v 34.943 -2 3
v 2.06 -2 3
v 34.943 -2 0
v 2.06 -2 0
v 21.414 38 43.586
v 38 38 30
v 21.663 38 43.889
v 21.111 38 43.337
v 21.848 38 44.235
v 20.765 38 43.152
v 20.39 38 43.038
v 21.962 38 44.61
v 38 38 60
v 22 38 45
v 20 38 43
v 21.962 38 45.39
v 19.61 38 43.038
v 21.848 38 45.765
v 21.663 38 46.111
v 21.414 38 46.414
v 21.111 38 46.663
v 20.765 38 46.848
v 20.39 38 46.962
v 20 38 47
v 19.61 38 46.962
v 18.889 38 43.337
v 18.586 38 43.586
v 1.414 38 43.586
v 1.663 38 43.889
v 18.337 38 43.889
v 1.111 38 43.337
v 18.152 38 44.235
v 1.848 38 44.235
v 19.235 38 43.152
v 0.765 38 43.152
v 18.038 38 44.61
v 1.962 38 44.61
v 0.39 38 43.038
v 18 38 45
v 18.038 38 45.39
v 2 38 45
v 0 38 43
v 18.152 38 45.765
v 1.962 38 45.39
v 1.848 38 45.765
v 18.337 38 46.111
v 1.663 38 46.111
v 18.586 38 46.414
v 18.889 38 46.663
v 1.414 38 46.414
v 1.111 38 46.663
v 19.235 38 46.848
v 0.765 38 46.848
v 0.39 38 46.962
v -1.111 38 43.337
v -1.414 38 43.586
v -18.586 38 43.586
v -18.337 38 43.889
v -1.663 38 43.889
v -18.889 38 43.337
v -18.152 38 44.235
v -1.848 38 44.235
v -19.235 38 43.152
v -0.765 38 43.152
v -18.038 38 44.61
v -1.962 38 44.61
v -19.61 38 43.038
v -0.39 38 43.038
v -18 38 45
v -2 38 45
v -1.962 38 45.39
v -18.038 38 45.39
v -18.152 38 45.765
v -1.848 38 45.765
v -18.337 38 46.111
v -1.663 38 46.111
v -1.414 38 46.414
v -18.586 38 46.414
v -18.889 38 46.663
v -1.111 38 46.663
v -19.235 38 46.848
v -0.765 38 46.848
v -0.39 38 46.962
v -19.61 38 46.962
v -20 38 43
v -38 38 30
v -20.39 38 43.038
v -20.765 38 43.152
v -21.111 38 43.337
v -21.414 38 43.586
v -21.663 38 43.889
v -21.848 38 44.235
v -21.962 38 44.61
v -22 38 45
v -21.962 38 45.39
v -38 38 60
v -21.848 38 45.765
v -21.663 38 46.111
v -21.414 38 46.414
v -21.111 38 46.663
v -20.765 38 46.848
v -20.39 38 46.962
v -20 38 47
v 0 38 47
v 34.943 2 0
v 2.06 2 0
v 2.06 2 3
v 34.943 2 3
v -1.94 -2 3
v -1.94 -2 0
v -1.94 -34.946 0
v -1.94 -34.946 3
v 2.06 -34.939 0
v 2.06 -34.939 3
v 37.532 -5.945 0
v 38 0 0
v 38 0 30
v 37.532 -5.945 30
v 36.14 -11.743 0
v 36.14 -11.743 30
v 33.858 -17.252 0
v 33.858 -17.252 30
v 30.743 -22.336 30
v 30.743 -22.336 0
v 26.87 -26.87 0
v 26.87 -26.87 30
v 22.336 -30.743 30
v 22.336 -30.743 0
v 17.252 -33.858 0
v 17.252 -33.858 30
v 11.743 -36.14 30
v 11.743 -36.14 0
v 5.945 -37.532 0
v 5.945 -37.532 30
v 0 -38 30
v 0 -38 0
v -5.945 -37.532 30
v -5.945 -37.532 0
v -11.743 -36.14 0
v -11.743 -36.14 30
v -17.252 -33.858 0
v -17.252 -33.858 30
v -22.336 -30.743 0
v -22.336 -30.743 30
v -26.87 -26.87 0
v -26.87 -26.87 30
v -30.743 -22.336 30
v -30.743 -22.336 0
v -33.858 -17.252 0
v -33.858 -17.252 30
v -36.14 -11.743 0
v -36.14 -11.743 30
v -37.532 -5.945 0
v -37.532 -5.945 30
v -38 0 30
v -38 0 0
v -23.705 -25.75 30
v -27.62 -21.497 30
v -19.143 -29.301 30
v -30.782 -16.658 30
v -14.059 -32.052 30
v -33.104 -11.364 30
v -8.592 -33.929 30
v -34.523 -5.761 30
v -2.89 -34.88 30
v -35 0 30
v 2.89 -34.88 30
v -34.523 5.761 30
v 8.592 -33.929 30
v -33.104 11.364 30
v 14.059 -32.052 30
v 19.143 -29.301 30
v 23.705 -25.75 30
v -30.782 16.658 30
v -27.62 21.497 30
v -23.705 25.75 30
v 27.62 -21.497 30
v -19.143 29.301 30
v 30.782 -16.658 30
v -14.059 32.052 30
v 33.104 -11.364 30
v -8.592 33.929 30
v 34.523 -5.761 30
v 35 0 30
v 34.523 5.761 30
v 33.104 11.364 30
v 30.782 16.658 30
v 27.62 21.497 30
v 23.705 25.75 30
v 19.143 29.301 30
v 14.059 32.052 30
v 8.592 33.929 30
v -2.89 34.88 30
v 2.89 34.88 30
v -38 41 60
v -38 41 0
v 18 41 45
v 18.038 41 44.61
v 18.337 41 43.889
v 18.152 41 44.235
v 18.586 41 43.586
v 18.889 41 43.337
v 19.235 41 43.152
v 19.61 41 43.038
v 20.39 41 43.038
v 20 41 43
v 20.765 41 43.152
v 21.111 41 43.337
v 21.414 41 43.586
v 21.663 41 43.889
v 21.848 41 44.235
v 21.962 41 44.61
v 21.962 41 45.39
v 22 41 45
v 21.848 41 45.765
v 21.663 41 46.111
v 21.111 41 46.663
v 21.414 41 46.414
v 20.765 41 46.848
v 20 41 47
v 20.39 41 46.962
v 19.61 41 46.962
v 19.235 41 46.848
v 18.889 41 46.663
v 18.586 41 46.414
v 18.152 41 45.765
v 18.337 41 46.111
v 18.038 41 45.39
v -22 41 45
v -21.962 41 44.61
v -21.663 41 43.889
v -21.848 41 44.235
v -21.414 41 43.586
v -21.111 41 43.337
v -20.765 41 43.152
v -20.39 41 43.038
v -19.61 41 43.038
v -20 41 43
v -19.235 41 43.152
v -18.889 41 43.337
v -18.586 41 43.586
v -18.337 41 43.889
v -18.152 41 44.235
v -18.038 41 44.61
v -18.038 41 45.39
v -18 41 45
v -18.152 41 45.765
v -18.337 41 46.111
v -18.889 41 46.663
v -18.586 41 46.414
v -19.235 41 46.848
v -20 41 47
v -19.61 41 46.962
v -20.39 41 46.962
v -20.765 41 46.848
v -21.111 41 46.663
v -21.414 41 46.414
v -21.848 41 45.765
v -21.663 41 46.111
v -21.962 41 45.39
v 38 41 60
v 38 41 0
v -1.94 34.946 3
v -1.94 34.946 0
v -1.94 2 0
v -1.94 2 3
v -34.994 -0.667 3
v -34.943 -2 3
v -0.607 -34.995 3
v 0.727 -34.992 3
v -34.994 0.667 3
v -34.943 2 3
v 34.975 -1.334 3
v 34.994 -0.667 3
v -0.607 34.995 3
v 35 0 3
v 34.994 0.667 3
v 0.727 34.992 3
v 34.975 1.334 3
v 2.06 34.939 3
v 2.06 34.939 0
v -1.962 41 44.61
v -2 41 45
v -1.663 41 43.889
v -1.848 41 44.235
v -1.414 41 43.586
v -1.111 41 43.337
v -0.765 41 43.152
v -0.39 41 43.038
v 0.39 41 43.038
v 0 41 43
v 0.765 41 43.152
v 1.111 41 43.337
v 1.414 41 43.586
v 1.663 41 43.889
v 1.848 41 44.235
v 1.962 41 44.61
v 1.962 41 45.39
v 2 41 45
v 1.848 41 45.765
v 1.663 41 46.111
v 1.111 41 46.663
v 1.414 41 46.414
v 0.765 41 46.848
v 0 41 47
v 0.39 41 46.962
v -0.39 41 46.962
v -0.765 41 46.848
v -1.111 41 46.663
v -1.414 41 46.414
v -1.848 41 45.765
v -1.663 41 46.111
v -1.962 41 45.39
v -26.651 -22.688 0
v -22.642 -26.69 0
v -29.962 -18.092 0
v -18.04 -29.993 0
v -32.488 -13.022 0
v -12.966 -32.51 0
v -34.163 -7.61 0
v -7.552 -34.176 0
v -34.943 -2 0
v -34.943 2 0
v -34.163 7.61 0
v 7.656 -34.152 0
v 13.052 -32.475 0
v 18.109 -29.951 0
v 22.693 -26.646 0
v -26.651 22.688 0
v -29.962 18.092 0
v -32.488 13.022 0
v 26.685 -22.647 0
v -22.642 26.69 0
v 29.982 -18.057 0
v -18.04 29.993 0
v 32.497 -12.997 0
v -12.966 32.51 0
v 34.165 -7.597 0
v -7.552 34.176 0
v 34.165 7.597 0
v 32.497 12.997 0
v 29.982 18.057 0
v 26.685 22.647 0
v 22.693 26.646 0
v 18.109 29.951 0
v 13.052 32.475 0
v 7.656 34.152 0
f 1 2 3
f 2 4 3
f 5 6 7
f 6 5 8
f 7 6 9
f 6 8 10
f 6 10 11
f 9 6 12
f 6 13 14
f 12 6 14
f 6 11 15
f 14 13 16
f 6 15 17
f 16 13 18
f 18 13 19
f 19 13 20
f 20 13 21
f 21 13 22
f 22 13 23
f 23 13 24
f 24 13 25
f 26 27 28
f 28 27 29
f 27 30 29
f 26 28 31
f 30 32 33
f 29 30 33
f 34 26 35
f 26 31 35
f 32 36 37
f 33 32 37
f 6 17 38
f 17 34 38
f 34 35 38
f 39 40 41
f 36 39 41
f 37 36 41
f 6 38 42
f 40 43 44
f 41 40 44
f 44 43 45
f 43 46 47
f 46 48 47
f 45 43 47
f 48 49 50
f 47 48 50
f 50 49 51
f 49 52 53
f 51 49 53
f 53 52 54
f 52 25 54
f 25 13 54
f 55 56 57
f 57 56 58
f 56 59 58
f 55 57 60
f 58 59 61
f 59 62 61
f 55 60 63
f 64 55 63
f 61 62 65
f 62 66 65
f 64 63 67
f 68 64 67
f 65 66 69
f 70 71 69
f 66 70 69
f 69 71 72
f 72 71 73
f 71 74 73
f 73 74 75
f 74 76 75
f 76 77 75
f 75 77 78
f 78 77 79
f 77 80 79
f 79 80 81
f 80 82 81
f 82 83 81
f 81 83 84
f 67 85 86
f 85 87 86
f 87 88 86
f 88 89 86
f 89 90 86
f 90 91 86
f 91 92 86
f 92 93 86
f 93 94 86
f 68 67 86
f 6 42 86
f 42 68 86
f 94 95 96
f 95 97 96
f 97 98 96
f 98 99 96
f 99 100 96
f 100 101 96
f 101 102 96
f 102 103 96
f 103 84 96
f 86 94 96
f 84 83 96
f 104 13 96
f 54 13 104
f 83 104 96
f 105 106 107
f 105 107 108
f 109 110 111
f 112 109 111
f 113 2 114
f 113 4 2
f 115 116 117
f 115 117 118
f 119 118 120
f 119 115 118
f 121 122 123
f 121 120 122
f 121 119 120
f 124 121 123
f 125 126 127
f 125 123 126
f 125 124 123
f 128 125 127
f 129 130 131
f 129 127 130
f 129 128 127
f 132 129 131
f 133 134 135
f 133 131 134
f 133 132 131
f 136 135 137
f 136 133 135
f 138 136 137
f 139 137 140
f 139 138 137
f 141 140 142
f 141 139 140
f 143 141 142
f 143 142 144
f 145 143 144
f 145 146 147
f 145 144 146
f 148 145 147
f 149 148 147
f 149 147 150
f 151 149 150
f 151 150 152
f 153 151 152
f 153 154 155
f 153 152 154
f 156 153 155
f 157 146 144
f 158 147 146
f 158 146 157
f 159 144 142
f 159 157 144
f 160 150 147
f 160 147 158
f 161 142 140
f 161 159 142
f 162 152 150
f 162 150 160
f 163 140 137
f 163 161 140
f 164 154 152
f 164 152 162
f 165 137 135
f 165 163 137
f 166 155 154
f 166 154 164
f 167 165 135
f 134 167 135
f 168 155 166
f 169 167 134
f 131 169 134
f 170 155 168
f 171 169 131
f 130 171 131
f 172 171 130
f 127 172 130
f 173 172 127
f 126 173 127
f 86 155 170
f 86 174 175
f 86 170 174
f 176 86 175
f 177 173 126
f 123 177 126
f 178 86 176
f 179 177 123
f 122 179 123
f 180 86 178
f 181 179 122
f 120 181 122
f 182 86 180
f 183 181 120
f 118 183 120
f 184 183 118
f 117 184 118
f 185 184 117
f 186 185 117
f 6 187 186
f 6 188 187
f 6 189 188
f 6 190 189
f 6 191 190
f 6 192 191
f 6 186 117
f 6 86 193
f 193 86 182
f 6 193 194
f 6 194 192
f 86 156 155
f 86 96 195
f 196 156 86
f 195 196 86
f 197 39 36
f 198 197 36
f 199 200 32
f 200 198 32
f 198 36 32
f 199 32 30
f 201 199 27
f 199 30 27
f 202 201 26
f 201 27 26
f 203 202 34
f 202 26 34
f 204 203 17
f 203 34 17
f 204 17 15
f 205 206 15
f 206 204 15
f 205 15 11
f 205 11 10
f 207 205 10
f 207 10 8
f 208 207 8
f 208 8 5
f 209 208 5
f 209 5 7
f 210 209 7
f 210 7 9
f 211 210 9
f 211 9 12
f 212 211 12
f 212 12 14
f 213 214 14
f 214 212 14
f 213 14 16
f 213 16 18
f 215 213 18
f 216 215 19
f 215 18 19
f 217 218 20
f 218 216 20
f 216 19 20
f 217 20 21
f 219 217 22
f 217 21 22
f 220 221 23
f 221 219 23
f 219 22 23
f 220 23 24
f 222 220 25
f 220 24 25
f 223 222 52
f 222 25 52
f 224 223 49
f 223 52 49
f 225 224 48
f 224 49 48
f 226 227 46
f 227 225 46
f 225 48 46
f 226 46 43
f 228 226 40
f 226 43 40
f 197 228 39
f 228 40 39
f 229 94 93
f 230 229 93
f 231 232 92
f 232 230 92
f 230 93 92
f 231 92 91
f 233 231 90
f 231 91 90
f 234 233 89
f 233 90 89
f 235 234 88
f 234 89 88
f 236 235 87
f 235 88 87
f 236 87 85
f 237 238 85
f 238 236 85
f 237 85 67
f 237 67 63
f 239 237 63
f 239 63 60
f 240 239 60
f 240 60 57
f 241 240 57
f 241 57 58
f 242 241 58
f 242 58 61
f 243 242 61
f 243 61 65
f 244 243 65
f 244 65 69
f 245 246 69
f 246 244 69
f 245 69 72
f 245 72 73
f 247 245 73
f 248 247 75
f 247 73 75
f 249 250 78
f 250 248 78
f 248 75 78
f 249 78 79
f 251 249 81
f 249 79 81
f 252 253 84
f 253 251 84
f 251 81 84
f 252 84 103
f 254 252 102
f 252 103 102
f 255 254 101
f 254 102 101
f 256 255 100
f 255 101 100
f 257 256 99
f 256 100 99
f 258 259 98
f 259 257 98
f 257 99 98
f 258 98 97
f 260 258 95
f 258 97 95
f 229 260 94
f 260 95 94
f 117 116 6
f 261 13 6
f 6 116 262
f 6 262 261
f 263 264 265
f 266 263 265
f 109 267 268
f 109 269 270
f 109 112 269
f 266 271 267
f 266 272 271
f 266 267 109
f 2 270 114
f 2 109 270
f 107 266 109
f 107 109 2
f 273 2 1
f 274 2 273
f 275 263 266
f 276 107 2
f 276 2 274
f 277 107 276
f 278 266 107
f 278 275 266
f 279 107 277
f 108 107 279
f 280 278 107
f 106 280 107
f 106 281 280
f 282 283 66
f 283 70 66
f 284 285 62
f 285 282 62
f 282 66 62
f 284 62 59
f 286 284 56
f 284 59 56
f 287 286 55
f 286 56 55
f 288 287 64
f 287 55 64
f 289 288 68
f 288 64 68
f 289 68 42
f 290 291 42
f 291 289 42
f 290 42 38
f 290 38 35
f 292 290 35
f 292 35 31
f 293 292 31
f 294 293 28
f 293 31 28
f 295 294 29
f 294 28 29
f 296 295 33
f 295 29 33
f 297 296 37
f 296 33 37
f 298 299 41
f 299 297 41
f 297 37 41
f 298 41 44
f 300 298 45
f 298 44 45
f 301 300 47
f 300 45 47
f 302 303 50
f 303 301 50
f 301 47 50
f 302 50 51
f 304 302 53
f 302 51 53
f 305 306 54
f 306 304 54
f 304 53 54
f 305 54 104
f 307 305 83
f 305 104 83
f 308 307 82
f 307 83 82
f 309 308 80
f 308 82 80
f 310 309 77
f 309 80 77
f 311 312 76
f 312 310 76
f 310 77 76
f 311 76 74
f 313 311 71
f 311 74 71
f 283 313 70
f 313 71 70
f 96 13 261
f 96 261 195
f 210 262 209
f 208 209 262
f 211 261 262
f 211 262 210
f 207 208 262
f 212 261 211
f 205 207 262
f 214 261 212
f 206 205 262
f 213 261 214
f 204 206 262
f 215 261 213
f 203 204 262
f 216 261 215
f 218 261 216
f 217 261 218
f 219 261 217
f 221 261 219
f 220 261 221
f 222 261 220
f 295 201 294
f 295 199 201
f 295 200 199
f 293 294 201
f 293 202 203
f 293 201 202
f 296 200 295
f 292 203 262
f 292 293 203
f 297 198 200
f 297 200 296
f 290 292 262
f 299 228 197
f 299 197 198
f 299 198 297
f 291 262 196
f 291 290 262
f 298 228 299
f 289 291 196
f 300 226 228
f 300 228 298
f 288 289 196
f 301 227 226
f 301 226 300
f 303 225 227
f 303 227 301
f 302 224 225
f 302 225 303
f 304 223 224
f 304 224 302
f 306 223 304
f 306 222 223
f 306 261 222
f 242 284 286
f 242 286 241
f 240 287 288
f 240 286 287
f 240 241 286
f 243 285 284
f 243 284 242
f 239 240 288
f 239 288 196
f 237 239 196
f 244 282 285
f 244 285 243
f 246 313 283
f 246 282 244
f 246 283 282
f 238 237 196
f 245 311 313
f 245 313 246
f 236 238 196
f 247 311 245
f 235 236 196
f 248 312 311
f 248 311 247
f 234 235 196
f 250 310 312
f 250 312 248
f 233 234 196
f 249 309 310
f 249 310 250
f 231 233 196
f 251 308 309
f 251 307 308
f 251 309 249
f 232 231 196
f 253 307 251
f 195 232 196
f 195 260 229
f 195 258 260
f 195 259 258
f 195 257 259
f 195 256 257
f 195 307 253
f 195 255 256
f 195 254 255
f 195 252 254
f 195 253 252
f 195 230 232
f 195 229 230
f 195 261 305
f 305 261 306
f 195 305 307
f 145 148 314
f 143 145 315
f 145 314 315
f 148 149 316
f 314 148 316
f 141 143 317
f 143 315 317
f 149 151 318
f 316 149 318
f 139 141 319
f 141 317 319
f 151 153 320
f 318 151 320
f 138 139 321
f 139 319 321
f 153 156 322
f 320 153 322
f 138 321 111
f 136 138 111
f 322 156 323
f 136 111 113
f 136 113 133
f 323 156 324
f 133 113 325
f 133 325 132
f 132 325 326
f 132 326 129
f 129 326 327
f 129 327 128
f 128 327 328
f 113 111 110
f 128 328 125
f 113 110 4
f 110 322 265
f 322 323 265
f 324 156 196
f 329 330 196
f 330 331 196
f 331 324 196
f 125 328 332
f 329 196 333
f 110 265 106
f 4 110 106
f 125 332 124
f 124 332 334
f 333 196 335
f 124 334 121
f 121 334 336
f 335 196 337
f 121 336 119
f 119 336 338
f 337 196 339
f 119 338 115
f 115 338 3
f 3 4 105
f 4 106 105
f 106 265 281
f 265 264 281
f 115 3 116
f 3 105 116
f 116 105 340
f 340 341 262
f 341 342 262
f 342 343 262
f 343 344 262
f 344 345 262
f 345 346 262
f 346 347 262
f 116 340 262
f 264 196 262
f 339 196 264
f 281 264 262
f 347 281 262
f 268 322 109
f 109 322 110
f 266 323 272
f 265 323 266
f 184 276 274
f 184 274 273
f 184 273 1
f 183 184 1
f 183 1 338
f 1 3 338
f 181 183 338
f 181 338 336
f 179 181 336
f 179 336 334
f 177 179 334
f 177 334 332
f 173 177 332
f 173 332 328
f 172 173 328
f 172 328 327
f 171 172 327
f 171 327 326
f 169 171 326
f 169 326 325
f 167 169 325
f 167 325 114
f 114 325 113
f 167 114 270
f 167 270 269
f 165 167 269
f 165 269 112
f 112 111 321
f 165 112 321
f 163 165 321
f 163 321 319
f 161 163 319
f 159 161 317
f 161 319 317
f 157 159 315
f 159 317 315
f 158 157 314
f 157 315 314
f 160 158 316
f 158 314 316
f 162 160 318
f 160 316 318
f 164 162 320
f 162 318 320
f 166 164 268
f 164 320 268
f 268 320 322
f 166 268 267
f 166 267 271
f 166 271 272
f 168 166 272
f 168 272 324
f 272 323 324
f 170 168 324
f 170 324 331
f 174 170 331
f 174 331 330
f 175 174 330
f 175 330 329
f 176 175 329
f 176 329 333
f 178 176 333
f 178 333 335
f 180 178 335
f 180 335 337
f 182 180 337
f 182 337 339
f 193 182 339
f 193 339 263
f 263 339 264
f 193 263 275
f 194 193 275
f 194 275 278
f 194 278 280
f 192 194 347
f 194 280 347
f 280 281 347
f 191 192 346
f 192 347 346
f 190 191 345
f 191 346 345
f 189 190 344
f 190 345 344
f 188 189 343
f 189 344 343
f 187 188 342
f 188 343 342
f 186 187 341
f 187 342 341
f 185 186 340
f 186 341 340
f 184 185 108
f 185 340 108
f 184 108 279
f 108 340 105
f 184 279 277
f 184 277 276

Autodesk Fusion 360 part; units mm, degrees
sketch "Sketch1" plane through (0, 0, 0) normal (0, 0, 1) x (1, 0, 0)
  circle A0 centre (0, 0) radius 35
  circle A1 centre (0, 0) radius 38
  line L0 (-38, 0) -> (-38, 38)
  line L1 (-38, 38) -> (0, 38)
  line L2 (0, 1.75) -> (0, 22.5)
  line L3 (38, 38) -> (0, 38)
  line L4 (38, 0) -> (38, 38)
  line L5 (2.0599, 34.9393) -> (2.0599, 2)
  line L6 (2.0599, -2) -> (2.0599, -34.9393)
  line L7 (-34.9428, 2) -> (-1.9401, 2)
  line L8 (2.0599, 2) -> (34.9428, 2)
  line L9 (-1.9401, 34.9462) -> (-1.9401, 2)
  line L10 (-1.9401, -2) -> (-1.9401, -34.9462)
  line L11 (-34.9428, -2) -> (-1.9401, -2)
  line L12 (2.0599, -2) -> (34.9428, -2)
  dimension "d1" = 70
  dimension "d2" = 3
  dimension "d27" = 38
  dimension "d28" = 38
extrude "Extrude1" add sketch "Sketch1" along normal blind 3 contours A0 L5 L6 L7 L8 L9 L10 L11 L12 | A1 | A1 L3 L4 | A1 L0 L1
sketch "Sketch3" plane through (0, 38, 0) normal (0, 1, 0) x (-1, 0, 0)
  line L0 (-38, 0) -> (38, 0)
  line L1 (38, 0) -> (38, 3)
  line L2 (38, 3) -> (-38, 3)
  line L3 (-38, 0) -> (38, 0)
  line L4 (38, 0) -> (38, 60)
  line L5 (38, 60) -> (0, 60)
  circle A0 centre (-20, 45) radius 2
  circle A1 centre (0, 45) radius 2
  circle A2 centre (20, 45) radius 2
  line L6 (-38, 60) -> (0, 60)
  line L7 (-38, 0) -> (-38, 60)
  line L8 (-38, 0) -> (38, 0)
  line L9 (-38, 3) -> (-38, 0)
  dimension "d9" = 60
  dimension "d10" = 38
  dimension "d11" = 4
extrude "Extrude4" add sketch "Sketch3" along normal blind 3
extrude "Extrude5" add sketch "Sketch1" along normal blind 30
